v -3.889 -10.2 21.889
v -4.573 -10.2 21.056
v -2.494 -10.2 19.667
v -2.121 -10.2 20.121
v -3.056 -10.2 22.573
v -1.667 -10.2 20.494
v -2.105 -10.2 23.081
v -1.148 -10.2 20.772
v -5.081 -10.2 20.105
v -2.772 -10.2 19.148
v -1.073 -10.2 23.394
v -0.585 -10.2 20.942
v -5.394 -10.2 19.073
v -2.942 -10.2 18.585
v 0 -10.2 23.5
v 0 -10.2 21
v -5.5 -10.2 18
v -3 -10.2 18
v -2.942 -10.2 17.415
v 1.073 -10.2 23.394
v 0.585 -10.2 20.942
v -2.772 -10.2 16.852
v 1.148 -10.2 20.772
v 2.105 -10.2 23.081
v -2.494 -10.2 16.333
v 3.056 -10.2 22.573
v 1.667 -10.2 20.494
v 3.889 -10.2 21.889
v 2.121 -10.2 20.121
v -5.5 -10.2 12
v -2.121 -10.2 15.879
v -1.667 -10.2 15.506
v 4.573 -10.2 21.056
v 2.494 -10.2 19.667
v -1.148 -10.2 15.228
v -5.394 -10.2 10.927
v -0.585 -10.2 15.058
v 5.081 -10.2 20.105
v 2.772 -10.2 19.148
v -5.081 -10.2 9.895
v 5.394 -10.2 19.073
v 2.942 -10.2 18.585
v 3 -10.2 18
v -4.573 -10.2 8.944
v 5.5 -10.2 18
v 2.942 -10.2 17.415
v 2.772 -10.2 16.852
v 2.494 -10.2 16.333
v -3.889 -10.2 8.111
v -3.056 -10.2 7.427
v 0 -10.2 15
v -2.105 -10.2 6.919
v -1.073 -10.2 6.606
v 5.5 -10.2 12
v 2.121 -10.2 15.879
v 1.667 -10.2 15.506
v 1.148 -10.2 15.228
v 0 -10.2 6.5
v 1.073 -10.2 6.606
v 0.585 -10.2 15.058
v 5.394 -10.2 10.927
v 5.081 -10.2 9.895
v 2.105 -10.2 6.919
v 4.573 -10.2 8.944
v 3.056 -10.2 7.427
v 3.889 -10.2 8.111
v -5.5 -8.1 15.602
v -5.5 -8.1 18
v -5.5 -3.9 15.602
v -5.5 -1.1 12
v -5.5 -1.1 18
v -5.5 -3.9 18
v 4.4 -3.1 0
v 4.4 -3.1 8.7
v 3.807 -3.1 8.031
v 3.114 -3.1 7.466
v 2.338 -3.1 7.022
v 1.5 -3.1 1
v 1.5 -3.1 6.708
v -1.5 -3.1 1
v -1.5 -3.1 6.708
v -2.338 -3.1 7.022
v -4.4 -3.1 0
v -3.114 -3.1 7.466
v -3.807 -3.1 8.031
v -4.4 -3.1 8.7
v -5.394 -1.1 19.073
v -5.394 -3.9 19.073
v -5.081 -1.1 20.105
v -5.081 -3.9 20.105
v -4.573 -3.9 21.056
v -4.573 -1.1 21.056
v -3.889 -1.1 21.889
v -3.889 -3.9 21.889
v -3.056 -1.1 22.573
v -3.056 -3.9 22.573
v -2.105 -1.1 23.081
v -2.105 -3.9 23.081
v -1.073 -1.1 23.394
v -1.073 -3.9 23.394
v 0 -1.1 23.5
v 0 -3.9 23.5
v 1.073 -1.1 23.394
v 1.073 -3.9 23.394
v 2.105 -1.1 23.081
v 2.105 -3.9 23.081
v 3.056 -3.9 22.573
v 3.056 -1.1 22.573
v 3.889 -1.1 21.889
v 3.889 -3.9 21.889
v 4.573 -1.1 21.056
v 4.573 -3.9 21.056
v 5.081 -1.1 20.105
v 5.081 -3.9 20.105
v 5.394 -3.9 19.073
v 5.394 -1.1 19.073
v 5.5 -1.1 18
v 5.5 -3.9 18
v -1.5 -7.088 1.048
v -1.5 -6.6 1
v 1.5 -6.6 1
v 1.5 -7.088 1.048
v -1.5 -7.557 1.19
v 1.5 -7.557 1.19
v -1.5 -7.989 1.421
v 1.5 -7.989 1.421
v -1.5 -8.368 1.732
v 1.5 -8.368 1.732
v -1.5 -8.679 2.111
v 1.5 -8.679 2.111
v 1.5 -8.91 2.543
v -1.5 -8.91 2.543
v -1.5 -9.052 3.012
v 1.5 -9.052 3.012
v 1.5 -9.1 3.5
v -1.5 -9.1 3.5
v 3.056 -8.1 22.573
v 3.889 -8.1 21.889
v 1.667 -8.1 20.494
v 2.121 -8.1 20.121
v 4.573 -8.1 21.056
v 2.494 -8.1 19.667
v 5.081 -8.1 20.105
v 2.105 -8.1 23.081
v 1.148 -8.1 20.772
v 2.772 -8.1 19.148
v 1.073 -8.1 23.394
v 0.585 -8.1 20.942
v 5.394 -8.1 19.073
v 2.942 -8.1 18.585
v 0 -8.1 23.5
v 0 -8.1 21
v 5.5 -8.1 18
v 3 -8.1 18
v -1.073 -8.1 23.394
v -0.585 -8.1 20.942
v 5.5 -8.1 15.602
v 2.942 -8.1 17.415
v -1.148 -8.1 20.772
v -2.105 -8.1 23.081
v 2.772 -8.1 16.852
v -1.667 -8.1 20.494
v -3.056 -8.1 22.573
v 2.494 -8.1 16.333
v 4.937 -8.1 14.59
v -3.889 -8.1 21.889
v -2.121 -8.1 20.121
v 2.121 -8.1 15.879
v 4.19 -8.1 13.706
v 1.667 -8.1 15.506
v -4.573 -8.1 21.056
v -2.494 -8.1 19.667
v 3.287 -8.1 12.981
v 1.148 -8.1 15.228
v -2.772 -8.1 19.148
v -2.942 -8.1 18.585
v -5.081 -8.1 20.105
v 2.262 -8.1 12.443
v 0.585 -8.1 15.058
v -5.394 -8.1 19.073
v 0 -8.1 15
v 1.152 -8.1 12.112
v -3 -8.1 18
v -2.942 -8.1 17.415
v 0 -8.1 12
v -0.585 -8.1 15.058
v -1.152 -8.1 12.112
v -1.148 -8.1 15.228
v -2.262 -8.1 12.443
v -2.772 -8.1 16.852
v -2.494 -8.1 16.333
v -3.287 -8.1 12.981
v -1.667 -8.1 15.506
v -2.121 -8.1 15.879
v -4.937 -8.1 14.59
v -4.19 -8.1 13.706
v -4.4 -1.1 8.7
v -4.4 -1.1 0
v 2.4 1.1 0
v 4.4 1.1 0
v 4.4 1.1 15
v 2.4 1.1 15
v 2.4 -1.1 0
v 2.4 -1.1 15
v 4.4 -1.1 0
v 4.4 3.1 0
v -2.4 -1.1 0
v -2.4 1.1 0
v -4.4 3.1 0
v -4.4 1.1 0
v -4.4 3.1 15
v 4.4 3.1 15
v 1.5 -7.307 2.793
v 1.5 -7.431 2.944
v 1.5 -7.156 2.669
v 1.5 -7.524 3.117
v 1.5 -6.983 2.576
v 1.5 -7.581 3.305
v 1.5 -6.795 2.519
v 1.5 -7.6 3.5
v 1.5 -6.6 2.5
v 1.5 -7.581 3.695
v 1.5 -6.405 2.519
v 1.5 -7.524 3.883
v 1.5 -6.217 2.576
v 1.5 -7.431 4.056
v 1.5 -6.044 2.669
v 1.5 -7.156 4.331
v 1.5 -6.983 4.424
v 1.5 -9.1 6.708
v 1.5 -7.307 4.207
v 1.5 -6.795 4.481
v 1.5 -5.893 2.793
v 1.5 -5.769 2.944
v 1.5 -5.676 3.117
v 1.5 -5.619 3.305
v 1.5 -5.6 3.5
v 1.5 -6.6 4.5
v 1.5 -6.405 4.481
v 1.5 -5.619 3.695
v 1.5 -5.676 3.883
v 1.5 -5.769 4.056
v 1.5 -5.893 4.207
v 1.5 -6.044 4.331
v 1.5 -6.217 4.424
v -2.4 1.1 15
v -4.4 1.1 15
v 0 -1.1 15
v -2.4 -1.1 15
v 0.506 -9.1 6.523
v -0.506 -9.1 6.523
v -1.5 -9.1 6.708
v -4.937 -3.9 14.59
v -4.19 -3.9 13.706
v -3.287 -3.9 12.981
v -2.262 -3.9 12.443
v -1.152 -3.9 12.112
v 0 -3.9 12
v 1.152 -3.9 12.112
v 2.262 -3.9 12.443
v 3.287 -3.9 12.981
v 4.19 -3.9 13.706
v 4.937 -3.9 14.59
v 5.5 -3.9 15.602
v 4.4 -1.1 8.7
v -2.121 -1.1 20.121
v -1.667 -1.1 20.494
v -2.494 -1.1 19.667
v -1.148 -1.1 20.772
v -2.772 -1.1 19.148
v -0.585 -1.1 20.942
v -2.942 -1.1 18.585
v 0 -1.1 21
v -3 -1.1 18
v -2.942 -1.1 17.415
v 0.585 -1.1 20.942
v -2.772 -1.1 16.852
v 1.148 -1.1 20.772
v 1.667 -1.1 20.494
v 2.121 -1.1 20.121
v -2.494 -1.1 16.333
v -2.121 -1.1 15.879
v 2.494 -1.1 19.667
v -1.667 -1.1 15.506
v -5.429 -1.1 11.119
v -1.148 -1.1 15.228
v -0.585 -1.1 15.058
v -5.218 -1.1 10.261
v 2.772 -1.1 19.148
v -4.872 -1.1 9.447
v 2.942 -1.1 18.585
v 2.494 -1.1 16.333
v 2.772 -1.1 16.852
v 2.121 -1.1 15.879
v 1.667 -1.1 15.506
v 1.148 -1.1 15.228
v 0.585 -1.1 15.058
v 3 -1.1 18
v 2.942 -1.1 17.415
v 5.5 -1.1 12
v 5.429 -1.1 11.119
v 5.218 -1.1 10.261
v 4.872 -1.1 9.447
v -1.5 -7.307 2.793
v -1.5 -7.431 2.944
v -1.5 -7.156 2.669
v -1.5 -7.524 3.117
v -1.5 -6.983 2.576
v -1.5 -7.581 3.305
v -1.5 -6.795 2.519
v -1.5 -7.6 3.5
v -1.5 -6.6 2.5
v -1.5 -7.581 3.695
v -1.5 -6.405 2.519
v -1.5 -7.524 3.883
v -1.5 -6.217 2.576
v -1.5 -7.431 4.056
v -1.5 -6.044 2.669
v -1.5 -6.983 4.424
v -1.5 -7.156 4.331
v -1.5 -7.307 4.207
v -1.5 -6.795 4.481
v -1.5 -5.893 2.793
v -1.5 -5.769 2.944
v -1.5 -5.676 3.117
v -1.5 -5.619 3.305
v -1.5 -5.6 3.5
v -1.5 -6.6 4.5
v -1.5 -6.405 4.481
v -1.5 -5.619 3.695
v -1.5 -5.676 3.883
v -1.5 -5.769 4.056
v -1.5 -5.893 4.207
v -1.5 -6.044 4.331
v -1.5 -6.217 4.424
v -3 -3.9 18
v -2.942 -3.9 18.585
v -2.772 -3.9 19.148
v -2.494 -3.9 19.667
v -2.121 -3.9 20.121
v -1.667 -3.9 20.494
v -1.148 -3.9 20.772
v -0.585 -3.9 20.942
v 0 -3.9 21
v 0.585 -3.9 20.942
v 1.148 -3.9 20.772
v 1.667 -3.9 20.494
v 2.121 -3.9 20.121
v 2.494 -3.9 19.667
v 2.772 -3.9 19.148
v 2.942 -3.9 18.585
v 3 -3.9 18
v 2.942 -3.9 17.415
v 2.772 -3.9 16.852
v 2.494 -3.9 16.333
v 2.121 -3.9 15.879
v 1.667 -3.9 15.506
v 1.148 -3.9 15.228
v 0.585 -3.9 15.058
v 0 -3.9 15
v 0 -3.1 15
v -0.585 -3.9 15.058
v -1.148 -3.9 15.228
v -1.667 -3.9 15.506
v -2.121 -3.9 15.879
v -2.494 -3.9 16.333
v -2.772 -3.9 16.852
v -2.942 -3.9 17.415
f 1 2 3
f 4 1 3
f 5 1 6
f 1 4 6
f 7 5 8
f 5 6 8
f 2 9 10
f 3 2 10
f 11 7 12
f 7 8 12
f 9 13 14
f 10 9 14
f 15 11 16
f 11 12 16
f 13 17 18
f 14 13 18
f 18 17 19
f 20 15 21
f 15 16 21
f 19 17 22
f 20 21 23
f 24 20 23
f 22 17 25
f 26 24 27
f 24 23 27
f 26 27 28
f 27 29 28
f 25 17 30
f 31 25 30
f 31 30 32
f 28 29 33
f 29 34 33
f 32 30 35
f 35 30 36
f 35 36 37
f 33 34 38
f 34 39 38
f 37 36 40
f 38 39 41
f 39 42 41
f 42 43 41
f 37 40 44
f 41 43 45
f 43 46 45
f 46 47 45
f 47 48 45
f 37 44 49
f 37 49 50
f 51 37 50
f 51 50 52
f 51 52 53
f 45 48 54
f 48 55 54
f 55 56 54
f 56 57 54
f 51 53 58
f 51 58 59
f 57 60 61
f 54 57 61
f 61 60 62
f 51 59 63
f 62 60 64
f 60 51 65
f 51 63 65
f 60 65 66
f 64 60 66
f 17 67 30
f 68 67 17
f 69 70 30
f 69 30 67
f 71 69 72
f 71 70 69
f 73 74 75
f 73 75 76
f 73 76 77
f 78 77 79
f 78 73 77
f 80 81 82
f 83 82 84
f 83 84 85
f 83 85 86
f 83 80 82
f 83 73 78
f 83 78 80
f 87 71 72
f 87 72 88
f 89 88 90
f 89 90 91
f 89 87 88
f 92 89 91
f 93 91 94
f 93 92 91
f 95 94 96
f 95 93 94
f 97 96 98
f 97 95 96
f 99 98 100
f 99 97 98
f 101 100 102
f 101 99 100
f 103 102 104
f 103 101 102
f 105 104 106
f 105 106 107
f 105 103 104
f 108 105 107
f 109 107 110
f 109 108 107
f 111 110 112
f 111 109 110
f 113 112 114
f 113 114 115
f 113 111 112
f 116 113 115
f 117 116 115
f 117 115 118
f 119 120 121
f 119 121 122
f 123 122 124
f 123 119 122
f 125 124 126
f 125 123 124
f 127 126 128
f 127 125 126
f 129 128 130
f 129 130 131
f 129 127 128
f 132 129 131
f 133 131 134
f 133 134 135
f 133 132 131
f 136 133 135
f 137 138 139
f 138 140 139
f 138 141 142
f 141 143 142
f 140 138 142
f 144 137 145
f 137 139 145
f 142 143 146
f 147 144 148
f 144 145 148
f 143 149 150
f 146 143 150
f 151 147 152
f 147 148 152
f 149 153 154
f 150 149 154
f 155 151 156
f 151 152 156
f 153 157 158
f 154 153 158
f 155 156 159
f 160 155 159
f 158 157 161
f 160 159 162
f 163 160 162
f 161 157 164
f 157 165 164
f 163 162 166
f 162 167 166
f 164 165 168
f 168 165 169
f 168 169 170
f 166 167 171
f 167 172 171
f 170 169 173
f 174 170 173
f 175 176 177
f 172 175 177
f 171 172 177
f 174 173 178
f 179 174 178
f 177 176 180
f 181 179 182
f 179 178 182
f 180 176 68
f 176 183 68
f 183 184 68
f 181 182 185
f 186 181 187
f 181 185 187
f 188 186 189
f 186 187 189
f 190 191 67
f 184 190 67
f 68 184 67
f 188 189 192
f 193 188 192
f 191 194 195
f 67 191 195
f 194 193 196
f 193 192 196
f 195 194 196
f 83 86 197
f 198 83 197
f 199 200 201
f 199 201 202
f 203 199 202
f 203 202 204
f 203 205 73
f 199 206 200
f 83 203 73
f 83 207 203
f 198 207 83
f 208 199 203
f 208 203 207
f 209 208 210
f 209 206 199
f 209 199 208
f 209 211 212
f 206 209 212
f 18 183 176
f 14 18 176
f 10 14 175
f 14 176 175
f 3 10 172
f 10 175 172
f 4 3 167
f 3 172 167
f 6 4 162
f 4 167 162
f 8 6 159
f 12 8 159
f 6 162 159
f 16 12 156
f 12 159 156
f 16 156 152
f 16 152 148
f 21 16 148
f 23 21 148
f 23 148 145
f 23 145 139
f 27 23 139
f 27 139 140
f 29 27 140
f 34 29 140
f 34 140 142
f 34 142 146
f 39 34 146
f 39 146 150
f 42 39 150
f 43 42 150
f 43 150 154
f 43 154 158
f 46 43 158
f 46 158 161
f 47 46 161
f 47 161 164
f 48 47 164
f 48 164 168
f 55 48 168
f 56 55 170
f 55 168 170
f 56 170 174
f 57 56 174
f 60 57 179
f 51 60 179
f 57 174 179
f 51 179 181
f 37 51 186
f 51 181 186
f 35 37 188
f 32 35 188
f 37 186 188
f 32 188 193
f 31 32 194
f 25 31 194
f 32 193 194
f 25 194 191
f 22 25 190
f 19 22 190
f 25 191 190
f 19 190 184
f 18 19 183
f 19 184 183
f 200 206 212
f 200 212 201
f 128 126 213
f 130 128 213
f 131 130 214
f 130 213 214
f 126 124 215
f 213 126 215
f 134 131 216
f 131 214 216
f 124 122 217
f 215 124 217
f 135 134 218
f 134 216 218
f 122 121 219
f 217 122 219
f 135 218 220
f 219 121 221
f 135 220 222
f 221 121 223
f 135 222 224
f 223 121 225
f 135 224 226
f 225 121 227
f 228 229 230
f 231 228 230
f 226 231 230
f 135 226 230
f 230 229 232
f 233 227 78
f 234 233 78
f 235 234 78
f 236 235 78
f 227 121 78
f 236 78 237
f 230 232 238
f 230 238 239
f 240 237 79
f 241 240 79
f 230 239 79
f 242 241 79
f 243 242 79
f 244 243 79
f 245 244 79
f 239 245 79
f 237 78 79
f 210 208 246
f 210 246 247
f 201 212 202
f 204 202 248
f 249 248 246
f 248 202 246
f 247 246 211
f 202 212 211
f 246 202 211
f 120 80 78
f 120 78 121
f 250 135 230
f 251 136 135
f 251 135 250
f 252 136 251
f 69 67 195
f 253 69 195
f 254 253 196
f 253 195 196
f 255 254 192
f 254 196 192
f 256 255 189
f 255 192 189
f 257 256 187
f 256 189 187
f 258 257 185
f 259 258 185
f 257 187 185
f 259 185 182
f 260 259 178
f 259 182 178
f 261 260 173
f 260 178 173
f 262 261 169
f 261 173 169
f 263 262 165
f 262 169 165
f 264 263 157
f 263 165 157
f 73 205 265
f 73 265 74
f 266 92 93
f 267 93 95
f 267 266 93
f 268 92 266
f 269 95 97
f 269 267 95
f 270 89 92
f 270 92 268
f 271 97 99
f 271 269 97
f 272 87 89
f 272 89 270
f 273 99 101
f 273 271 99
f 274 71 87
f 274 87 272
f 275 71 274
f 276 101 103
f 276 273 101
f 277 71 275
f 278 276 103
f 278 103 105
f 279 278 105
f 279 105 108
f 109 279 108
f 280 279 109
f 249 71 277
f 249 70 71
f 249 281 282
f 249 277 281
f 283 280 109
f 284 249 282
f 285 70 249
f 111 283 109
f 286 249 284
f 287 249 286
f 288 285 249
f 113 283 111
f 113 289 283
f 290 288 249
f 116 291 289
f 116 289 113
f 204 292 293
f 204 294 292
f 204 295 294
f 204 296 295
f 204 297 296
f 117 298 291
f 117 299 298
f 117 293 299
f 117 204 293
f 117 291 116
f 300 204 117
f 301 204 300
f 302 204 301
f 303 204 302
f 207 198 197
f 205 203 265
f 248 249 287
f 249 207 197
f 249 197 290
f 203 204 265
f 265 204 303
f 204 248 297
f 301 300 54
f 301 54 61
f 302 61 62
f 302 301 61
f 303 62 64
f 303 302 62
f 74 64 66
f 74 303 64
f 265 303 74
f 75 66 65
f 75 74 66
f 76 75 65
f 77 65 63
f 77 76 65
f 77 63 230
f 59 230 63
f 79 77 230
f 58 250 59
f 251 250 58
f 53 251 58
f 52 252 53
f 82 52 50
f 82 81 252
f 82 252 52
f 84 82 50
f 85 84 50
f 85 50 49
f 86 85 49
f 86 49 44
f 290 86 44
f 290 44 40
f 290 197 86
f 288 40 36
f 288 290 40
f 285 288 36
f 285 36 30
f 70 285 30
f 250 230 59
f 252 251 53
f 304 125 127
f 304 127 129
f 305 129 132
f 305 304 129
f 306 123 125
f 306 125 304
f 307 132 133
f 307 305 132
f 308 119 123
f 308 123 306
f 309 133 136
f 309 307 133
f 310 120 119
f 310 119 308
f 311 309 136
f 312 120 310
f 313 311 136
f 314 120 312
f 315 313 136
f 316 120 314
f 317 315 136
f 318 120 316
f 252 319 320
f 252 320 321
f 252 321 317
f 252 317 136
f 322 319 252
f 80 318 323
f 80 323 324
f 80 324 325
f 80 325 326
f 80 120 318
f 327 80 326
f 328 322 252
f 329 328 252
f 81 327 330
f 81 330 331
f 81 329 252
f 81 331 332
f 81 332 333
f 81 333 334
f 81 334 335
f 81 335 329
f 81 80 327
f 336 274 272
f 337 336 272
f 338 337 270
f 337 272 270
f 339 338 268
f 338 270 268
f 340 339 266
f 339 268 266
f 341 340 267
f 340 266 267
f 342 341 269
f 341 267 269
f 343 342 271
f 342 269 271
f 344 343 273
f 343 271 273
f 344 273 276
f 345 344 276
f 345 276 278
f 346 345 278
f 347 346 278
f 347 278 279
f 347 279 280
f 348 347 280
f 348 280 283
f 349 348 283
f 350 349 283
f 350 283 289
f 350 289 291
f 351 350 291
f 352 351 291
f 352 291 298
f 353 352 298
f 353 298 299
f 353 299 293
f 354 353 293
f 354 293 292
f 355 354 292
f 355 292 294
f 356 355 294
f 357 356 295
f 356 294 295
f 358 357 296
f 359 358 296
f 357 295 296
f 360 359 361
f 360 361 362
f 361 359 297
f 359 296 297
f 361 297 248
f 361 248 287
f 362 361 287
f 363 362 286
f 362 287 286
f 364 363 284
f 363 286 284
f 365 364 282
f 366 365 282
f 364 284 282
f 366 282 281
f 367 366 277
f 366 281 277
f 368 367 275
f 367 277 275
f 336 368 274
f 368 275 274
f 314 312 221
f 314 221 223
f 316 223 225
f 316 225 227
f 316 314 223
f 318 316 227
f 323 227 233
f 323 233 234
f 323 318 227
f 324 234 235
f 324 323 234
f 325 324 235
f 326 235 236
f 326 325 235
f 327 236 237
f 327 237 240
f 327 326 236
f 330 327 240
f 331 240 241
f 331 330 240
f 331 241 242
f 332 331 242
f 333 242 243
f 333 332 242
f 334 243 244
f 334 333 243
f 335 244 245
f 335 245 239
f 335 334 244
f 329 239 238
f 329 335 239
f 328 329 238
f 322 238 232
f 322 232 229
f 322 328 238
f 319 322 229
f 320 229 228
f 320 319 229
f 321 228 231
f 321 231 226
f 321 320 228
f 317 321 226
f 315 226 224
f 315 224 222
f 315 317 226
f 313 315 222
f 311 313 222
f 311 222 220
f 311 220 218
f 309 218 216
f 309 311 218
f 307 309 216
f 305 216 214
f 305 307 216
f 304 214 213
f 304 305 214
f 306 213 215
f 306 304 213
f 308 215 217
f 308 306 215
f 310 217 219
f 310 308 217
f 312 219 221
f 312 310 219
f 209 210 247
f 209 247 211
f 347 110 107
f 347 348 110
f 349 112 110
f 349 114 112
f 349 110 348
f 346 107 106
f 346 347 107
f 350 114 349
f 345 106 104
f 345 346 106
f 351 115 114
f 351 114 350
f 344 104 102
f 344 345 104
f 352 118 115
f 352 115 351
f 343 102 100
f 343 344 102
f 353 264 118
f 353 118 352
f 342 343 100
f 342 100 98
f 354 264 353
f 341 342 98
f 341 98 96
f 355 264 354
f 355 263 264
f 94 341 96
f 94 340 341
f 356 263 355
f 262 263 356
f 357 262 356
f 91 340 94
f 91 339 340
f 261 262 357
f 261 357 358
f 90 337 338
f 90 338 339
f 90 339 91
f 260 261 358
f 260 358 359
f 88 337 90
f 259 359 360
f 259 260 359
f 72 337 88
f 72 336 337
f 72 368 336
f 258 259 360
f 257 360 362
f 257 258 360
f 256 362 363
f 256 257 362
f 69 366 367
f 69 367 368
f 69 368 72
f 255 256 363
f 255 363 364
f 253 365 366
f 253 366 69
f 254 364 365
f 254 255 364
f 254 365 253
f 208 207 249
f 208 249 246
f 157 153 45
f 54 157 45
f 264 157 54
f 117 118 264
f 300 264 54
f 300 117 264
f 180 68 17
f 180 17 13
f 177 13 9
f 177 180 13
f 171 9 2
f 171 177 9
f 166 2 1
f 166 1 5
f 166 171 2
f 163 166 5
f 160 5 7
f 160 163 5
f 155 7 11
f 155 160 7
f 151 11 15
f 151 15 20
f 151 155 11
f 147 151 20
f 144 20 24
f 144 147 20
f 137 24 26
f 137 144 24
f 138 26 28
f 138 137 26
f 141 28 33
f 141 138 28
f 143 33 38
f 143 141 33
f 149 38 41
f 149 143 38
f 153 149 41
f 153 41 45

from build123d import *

# Parameters (mm, degrees)
BOSS_EXTRUDE1_DEPTH      = 15
SKETCH5_R                = 3
BOSS_EXTRUDE3_DEPTH      = 9.1
SKETCH6_R                = 6
CUT_EXTRUDE1_DEPTH       = 4.2
BOSS_EXTRUDE4_DEPTH      = 1.5
BOSS_EXTRUDE4_DEPTH_BACK = 1.5
SKETCH7_R                = 1


with BuildPart() as part:
    # Sketch1 → Boss-Extrude1 (new body)
    with BuildSketch(Plane.XY):
        Polygon((-2.4, -1.1), (-2.4, 1.1), (-4.4, 1.1), (-4.4, 3.1), (4.4, 3.1), (4.4, 1.1), (2.4, 1.1), (2.4, -1.1), (4.4, -1.1), (4.4, -3.1), (-4.4, -3.1), (-4.4, -1.1), align=None)
    extrude(amount=BOSS_EXTRUDE1_DEPTH)

    # Sketch5 → Boss-Extrude3 (add)
    with BuildSketch(Plane(origin=(0, -1.1, 0), x_dir=(1, 0, 0), z_dir=(0, 1, 0))):
        with BuildLine():
            Line((5.5, -18), (5.5, -12))
            ThreePointArc((5.5, -12), (0, -6.5), (-5.5, -12))
            Line((-5.5, -12), (-5.5, -18))
            ThreePointArc((-5.5, -18), (0, -23.5), (5.5, -18))
        make_face()
        with Locations(Location((0, -18, 0), (0, 0, 180))):
            Circle(SKETCH5_R, mode=Mode.SUBTRACT)
    extrude(amount=-BOSS_EXTRUDE3_DEPTH)

    # Sketch6 → Cut-Extrude1 (cut)
    with BuildSketch(Plane(origin=(0, -8.1, 0), x_dir=(-1, 0, 0), z_dir=(0, -1, 0))):
        with Locations((0, -18)):
            Circle(SKETCH6_R)
    extrude(amount=-CUT_EXTRUDE1_DEPTH, mode=Mode.SUBTRACT)

    # Sketch7 → Boss-Extrude4 (add, two sides: drawn at the far end of the back side and taken through both)
    with BuildSketch(Plane(origin=(0, 0, 0), x_dir=(0, 0, -1), z_dir=(1, 0, 0)).offset(-BOSS_EXTRUDE4_DEPTH_BACK)):
        with BuildLine():
            Line((-3.5, -9.1), (-6.5, -9.1))
            Line((-6.5, -9.1), (-9.5, -9.1))
            Line((-9.5, -9.1), (-9.5, -3.1))
            Line((-9.5, -3.1), (-1, -3.1))
            Line((-1, -3.1), (-1, -6.6))
            ThreePointArc((-1, -6.6), (-1.732233047, -8.367766953), (-3.5, -9.1))
        make_face()
        with Locations((-3.5, -6.6)):
            Circle(SKETCH7_R, mode=Mode.SUBTRACT)
    extrude(amount=BOSS_EXTRUDE4_DEPTH + BOSS_EXTRUDE4_DEPTH_BACK)


solid = part.part
